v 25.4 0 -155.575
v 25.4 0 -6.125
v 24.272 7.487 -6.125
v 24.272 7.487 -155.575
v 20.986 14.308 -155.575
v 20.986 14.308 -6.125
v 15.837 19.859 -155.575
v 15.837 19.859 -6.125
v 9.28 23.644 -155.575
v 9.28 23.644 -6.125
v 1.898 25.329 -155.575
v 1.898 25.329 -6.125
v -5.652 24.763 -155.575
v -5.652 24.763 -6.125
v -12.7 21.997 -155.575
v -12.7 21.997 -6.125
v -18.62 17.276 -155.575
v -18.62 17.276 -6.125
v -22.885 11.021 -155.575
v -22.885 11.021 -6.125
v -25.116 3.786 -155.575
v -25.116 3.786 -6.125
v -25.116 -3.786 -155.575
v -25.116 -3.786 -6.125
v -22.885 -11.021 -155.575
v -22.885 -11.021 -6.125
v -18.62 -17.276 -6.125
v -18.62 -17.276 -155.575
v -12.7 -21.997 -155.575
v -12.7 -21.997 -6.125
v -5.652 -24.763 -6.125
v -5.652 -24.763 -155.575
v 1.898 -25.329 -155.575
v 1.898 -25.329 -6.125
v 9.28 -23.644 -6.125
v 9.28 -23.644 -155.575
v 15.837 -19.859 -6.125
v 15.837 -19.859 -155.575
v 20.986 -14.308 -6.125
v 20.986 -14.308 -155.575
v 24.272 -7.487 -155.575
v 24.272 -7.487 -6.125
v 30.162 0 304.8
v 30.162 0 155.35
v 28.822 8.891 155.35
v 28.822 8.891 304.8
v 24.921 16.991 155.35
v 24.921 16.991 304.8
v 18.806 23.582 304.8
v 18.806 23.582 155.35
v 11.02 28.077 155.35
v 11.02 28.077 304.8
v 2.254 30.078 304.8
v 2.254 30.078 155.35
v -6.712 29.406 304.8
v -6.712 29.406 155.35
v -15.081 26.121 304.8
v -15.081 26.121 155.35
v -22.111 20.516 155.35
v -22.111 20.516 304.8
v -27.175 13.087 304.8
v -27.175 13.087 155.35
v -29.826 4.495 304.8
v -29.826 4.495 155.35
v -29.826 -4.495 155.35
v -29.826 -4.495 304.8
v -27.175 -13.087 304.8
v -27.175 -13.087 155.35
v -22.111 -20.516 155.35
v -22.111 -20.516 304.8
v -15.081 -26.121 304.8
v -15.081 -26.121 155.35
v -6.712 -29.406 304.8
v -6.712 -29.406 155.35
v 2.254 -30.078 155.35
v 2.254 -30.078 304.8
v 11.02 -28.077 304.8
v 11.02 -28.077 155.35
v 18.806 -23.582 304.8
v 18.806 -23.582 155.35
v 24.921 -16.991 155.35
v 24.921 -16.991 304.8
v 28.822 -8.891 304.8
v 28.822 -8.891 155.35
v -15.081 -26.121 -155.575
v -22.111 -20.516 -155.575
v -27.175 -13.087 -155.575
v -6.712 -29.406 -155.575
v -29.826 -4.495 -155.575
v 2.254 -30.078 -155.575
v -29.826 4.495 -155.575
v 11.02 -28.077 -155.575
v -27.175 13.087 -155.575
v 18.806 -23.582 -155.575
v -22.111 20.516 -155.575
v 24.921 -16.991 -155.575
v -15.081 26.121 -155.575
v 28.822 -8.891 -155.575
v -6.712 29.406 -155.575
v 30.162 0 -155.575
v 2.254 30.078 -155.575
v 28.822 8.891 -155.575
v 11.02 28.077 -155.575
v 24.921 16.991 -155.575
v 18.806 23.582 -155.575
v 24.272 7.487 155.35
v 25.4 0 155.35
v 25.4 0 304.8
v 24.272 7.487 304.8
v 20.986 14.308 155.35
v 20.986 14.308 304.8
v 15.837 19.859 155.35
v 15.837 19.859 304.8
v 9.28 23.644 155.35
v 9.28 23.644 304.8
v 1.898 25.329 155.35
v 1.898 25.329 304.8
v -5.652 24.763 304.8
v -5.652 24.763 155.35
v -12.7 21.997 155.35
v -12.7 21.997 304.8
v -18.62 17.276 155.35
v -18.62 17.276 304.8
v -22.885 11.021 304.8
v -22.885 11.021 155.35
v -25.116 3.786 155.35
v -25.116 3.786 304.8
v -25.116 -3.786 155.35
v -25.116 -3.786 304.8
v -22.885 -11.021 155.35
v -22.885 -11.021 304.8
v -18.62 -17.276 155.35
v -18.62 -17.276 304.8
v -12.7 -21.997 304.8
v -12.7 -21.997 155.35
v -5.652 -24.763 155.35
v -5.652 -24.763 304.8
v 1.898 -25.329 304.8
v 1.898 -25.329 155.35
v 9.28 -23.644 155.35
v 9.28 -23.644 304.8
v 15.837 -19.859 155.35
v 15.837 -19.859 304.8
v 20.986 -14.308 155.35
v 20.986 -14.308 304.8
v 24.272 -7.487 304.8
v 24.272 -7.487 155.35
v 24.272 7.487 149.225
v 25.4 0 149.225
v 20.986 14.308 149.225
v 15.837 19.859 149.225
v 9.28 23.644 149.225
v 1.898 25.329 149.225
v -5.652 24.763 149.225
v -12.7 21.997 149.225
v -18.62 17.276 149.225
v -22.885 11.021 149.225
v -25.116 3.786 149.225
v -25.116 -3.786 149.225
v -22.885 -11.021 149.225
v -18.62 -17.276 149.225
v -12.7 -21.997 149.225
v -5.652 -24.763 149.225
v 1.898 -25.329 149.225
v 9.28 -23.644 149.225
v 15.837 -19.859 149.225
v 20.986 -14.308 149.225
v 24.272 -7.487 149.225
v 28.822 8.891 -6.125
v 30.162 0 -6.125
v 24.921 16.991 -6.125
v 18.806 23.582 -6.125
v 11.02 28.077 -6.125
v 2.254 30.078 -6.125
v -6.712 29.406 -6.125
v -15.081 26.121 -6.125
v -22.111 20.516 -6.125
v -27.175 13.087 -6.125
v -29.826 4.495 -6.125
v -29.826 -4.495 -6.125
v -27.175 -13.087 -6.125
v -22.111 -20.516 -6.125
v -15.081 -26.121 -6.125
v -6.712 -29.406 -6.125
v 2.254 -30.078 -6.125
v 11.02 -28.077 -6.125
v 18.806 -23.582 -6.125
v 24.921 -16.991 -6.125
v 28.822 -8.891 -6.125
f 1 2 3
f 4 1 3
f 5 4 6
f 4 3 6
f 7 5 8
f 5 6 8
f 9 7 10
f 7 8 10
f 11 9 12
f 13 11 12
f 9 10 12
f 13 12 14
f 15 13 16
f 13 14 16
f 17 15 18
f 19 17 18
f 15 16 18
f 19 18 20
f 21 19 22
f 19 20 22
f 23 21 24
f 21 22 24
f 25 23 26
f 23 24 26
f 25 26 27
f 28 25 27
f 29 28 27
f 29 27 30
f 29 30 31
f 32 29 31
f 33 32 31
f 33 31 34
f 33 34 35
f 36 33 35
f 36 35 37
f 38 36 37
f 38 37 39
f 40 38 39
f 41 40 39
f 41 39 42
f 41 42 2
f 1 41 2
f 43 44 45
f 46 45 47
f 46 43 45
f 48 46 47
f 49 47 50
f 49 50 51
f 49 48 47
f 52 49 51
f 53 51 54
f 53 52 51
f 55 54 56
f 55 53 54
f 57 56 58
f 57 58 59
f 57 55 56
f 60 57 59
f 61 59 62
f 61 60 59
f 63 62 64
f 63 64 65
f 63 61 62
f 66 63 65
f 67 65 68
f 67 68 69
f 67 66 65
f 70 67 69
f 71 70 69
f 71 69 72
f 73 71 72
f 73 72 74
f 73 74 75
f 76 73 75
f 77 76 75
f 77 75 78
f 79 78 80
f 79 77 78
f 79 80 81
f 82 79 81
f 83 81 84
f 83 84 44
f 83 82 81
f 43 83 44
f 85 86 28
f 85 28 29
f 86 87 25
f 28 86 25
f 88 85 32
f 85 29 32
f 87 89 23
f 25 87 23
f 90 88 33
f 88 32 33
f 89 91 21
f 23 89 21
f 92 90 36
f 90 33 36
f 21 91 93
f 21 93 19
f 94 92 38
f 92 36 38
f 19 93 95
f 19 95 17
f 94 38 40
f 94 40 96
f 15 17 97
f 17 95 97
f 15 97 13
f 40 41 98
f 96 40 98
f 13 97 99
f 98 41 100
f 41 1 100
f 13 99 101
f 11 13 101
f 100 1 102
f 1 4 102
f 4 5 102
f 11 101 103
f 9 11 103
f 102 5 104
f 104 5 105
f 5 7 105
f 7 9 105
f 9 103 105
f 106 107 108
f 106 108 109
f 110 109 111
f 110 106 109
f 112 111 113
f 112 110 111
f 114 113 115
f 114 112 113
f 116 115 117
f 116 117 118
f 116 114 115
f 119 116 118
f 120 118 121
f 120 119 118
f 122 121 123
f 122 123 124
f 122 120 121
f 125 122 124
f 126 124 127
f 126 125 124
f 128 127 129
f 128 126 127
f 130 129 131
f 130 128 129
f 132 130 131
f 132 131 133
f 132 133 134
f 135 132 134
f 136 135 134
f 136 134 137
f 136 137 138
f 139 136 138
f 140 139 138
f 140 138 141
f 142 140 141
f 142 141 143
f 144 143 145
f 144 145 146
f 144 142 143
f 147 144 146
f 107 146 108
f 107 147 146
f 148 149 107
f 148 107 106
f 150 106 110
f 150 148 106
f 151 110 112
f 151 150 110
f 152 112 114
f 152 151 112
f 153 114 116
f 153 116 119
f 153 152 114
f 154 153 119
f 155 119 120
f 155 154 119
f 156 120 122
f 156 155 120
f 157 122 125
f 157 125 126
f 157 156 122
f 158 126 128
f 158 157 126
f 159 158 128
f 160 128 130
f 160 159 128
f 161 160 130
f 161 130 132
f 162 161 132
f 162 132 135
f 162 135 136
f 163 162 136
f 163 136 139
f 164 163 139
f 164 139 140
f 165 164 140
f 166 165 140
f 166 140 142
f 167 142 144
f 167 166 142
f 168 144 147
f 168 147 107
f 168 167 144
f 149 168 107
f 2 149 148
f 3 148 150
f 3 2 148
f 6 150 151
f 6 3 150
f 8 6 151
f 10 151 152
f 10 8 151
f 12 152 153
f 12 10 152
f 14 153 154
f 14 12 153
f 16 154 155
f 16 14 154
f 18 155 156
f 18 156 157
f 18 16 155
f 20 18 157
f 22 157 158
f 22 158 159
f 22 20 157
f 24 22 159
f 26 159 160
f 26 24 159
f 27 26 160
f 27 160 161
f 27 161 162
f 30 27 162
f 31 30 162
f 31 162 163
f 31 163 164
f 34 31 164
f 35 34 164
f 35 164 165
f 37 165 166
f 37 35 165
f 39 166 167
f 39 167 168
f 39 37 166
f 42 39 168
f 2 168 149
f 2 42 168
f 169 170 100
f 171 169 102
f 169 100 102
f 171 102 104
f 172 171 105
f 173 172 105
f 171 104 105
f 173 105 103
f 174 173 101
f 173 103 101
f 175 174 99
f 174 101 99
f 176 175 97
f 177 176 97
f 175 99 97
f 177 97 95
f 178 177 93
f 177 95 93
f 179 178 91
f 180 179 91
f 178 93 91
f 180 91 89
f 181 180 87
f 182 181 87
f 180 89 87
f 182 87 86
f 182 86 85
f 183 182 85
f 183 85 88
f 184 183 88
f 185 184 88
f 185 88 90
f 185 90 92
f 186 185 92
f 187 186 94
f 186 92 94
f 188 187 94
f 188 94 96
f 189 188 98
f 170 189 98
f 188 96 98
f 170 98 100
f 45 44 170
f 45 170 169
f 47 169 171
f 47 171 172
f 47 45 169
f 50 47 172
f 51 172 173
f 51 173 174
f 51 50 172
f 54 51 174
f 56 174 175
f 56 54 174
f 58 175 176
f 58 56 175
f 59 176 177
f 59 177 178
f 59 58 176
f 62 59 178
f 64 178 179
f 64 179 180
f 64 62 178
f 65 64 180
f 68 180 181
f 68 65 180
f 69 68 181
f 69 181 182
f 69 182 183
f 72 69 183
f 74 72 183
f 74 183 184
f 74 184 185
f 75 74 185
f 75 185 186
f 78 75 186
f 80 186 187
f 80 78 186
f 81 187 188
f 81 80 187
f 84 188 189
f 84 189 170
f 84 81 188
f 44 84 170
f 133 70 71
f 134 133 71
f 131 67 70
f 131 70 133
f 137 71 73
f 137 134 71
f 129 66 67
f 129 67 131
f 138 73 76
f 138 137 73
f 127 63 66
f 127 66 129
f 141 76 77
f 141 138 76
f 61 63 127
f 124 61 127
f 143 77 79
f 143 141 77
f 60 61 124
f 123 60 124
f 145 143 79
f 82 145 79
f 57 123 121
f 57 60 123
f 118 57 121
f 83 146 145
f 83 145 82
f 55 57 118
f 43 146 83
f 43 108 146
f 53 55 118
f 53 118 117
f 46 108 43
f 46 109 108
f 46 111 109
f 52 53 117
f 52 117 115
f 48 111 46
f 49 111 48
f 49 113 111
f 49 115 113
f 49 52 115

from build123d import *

# Parameters (mm, degrees)
F0_R          = 30.1625
F0_R_2        = 25.4
F1_DEPTH      = 304.8
F1_DEPTH_BACK = 6.125


# Not quite as in the source:
# - a pattern or mirror of a feature is missing from the dataset's text; its kind, count and spacing are read off the source's solid


with BuildPart() as f1:
    # F0 (on Top) → F1 (new body, two sides)
    with BuildSketch(Plane.XY) as f1_sk:
        Circle(F0_R)
        Circle(F0_R_2, mode=Mode.SUBTRACT)
    extrude(amount=F1_DEPTH)
    extrude(f1_sk.sketch, amount=-F1_DEPTH_BACK)

    # F1_copies: F1 across plane


with BuildPart() as f1_1:
    add(f1.part)
    add(f1.part.mirror(Plane(origin=(0, 0, 74.6125), x_dir=(-1, 0, 0), z_dir=(0, 0, -1))))


solid = f1_1.part
